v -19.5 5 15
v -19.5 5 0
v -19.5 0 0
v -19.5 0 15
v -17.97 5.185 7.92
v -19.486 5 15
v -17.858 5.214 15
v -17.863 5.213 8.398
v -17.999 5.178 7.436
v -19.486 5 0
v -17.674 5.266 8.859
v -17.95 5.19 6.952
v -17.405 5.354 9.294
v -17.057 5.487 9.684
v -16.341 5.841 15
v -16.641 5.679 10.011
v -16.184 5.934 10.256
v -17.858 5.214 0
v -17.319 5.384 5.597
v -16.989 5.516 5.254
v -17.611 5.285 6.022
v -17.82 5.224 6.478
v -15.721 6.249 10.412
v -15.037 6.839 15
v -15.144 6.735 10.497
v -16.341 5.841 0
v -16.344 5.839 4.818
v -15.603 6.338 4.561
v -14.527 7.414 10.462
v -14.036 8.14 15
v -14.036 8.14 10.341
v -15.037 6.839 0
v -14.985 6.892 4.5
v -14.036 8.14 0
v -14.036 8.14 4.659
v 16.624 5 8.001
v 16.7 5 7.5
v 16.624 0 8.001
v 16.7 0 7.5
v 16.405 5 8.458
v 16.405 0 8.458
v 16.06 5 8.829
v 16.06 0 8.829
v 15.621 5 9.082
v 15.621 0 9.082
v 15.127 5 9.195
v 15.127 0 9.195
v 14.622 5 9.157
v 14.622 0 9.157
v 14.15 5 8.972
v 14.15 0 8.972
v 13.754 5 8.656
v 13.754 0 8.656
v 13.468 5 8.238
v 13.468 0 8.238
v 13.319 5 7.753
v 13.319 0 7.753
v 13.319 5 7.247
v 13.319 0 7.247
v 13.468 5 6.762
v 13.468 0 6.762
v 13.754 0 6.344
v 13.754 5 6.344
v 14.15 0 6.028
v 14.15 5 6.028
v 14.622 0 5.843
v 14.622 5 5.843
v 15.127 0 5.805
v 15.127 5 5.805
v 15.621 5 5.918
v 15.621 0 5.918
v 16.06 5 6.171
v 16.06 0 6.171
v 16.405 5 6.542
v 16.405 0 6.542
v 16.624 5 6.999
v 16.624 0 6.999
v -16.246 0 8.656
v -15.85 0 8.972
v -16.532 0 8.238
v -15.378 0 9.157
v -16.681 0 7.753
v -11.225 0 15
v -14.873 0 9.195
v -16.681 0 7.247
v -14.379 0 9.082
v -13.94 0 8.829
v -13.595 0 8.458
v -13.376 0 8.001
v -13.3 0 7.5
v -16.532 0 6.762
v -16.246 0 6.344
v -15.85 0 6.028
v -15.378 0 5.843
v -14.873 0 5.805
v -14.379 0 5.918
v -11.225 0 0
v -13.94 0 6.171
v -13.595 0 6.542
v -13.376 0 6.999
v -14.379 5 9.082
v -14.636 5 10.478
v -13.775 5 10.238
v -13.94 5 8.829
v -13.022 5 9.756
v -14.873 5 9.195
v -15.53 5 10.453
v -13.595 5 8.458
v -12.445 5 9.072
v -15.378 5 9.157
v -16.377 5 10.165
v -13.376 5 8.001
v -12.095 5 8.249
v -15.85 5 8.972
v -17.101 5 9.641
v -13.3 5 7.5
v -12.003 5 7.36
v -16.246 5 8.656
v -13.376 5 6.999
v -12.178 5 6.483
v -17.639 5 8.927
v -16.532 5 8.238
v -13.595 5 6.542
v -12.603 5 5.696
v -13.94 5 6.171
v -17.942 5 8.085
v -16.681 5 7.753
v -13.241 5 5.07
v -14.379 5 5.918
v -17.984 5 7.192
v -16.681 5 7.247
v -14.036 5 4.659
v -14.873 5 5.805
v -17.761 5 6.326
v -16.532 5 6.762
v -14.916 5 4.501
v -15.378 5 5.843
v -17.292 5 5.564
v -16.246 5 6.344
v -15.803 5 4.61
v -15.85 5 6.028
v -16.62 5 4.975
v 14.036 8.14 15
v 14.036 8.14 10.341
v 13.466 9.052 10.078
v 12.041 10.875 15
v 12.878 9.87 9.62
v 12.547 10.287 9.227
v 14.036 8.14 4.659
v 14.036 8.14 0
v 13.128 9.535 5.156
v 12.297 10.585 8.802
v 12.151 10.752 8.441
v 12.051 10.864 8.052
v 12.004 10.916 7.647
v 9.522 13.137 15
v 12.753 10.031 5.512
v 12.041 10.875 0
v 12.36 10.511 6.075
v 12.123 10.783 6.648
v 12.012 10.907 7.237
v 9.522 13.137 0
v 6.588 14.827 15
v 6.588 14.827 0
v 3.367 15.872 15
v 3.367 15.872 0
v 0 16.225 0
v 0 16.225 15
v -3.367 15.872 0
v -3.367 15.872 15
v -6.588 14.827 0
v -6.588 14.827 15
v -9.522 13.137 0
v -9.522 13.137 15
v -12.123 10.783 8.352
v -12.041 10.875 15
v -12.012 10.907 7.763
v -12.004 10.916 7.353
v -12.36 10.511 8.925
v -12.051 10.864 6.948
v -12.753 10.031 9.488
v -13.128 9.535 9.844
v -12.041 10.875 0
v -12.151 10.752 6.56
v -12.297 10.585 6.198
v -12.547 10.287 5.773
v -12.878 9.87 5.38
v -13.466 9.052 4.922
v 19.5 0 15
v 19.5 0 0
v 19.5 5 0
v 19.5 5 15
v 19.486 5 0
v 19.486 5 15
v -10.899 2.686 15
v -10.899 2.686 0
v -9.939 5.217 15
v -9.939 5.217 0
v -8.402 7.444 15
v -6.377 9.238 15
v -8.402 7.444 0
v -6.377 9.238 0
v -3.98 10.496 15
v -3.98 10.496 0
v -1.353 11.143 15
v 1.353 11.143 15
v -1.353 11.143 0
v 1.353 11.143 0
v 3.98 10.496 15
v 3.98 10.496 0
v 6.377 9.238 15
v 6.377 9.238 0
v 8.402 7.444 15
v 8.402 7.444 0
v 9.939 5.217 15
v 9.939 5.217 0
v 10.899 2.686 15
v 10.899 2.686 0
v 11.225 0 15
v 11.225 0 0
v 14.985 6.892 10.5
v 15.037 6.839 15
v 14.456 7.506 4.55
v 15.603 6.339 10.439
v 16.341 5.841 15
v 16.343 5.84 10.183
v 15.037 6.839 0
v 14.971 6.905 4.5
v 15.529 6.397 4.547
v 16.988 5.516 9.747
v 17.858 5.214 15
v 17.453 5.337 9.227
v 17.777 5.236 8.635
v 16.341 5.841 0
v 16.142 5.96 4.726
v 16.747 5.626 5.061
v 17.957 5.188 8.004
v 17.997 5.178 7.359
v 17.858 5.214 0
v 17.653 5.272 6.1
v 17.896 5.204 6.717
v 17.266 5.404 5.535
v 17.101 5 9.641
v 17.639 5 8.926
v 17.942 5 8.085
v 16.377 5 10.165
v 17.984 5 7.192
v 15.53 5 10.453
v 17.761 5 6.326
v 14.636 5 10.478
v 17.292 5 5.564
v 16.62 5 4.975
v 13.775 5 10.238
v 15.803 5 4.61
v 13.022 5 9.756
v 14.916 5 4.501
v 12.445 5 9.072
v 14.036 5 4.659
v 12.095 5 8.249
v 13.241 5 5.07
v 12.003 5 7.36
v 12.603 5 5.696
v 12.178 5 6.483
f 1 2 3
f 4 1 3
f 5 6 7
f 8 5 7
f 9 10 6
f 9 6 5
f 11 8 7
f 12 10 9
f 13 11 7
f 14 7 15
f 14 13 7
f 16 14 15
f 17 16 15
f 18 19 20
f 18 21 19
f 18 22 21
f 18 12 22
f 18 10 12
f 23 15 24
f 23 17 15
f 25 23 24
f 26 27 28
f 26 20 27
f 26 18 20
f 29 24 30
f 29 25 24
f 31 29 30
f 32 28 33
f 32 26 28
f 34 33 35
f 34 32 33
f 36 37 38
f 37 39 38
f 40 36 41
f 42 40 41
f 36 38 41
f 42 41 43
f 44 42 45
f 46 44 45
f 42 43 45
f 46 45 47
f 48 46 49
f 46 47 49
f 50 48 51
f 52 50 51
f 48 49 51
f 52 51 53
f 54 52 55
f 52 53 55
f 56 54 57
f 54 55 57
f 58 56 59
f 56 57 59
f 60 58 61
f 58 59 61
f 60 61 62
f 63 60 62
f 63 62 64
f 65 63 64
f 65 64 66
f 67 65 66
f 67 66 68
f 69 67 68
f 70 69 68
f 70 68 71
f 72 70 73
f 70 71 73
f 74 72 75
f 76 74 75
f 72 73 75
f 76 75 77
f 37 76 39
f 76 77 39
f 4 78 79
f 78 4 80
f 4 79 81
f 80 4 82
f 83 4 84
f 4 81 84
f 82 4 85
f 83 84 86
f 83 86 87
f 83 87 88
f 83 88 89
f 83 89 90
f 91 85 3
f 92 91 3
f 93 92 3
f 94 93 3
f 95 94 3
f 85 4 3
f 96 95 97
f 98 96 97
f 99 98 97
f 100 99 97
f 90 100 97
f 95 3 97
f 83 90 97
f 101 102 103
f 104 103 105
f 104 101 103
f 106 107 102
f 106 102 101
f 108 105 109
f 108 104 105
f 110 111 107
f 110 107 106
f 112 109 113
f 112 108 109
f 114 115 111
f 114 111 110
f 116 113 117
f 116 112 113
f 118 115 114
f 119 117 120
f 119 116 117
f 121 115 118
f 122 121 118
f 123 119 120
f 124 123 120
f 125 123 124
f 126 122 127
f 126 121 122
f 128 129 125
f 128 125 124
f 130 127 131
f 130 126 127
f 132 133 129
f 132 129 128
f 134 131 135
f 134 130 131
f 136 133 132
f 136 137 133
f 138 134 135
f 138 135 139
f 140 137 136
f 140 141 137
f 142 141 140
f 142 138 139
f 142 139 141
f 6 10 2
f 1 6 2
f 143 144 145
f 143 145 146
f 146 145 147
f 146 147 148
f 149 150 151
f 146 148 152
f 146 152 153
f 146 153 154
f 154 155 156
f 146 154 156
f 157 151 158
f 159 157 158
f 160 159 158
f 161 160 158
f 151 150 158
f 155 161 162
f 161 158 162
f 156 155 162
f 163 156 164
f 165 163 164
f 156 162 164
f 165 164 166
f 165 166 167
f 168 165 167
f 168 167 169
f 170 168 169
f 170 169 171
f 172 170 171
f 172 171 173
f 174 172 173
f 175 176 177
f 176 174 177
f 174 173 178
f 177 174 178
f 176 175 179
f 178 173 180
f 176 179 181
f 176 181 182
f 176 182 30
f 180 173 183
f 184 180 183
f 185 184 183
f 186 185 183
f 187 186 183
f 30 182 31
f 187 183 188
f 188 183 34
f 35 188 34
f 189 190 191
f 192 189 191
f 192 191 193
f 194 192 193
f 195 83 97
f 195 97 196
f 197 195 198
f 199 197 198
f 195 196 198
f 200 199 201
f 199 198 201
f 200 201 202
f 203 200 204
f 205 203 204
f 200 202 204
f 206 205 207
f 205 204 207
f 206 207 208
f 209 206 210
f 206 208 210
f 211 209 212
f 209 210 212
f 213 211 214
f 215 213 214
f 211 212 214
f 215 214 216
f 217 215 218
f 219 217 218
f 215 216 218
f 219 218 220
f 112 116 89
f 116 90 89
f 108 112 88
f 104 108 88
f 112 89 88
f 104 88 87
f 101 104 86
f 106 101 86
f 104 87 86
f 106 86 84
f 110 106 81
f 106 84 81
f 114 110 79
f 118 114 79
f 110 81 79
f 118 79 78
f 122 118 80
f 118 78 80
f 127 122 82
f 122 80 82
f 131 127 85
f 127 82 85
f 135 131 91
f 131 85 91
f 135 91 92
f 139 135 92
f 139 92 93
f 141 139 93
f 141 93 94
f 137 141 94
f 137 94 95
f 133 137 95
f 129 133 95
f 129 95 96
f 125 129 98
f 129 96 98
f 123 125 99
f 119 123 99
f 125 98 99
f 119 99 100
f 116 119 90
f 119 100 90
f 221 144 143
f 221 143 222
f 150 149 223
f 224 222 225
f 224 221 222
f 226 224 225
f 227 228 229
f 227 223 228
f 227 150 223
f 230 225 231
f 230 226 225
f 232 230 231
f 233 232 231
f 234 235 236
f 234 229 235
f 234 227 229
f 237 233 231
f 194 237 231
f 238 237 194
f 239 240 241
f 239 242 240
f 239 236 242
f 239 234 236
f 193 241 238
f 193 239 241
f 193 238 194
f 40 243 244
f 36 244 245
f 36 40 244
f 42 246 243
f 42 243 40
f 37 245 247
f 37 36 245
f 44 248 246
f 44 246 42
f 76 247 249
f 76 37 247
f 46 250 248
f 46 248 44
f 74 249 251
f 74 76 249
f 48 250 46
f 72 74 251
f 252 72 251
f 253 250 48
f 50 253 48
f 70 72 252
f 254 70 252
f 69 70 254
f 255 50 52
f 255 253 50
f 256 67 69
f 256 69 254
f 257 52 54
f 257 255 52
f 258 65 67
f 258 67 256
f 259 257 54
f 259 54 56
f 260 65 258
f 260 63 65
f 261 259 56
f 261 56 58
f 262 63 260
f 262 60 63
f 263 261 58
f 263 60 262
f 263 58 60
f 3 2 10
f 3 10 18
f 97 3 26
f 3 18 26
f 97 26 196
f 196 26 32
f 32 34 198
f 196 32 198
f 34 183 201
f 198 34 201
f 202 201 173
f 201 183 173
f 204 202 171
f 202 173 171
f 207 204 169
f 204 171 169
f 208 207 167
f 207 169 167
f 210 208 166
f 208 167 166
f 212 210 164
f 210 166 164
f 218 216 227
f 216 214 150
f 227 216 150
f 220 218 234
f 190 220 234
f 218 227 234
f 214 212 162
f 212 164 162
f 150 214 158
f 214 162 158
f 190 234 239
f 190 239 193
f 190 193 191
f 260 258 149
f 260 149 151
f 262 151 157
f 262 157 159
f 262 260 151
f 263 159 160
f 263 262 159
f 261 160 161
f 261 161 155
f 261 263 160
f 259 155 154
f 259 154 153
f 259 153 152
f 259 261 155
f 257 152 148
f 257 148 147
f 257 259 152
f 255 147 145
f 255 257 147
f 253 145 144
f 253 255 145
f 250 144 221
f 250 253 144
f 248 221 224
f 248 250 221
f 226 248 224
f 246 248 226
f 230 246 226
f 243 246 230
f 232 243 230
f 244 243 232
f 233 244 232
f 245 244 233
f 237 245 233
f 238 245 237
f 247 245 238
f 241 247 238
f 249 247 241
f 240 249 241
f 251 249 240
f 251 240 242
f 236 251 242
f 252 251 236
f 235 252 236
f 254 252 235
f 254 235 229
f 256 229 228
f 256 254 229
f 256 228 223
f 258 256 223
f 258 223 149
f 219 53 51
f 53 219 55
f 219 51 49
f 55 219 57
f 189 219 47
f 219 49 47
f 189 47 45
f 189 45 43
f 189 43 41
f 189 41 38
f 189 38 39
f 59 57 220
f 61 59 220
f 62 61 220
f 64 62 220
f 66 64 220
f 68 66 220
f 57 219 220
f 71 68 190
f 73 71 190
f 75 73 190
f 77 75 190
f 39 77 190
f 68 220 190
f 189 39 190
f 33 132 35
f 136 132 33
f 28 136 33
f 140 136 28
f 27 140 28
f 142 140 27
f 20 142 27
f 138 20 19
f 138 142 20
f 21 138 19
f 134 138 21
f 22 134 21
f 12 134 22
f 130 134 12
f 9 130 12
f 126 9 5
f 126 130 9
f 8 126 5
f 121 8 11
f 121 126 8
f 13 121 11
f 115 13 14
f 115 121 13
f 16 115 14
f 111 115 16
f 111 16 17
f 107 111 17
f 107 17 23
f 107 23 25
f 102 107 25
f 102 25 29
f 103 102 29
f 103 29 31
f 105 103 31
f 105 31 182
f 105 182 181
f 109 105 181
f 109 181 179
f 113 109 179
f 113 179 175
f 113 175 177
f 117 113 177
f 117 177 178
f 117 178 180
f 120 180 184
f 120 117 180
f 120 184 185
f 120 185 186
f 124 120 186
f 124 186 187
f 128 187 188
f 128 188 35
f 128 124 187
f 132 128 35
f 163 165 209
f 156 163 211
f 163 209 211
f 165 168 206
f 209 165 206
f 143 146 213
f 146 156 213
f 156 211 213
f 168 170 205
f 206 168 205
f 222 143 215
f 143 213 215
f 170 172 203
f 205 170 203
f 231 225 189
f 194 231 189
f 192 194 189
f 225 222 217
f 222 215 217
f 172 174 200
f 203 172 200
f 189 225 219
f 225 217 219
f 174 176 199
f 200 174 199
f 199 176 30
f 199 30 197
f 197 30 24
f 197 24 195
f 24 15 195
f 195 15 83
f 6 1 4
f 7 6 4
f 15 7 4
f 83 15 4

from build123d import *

# Parameters (mm, degrees)
Y_KSEKLIK_EKSTR_ZYON1_DEPTH = 15
IZIM2_R                     = 1.7
KES_EKSTR_ZYON2_DEPTH       = 15
RADYUS3_R                   = 6.3
IZIM3_R                     = 3
KES_EKSTR_ZYON3_DEPTH       = 15


with BuildPart() as part:
    # Çizim1 → Yükseklik-Ekstrüzyon1 (new body)
    with BuildSketch(Plane.XY):
        with BuildLine():
            Line((-19.5, 0), (-11.225, 0))
            ThreePointArc((-11.225, 0), (0, 11.225), (11.225, 0))
            Line((11.225, 0), (19.5, 0))
            Line((19.5, 0), (19.5, 5))
            Line((19.5, 5), (15.435369286, 5))
            ThreePointArc((15.435369286, 5), (0, 16.225), (-15.435369286, 5))
            Line((-15.435369286, 5), (-19.5, 5))
            Line((-19.5, 5), (-19.5, 0))
        make_face()
    extrude(amount=Y_KSEKLIK_EKSTR_ZYON1_DEPTH)

    # Çizim2 → Kes-Ekstrüzyon2 (cut)
    with BuildSketch(Plane.XZ):
        with Locations((-15, 7.5)):
            Circle(IZIM2_R)
        with Locations((15, 7.5)):
            Circle(IZIM2_R)
    extrude(amount=-KES_EKSTR_ZYON2_DEPTH, mode=Mode.SUBTRACT)

    # Radyus3
    # the kernel refuses this fillet: 6.3 mm, written as the material it adds along each edge
    with BuildSketch(Plane(origin=(-15.435369286, 5, -0.982079778), x_dir=(-1, 0, 0), z_dir=(0, 0, 1))) as radyus3_piece_1_section:
        with BuildLine():
            CenterArc((4.050154186, -6.3), RADYUS3_R, 90, 59.889795344)
            ThreePointArc((-1.399736951, -3.139511654), (-0.61649222, -1.60692875), (0, 0))
            Line((0, 0), (4.050154186, 0))
        make_face()
    radyus3_piece_1 = extrude(amount=15.982079778, mode=Mode.PRIVATE)
    radyus3_piece_1 = split(radyus3_piece_1, bisect_by=Plane(origin=(-18.387347424, 5.060237856, 0), z_dir=(0, 0, 1)), keep=Keep.TOP, mode=Mode.PRIVATE)
    radyus3_piece_1 = radyus3_piece_1 - Plane(origin=(-15, 5.060237856, 7.5), x_dir=(1, 0, 0), z_dir=(0, -1, 0)) * Cylinder(1.7, 49, mode=Mode.PRIVATE)
    add(radyus3_piece_1)
    with BuildSketch(Plane(origin=(15.435369286, 5, -0.982079778), x_dir=(-0.4072067026202576, 0.9133360287107571, 0), z_dir=(0, 0, 1))) as radyus3_piece_2_section:
        with BuildLine():
            CenterArc((4.10476705, -6.264553967), RADYUS3_R, 96.080720065, 59.889795344)
            Line((-1.649249931, -3.69915174), (0, 0))
            ThreePointArc((0, 0), (1.718705687, -0.091287601), (3.437411374, 0))
        make_face()
    radyus3_piece_2 = extrude(amount=15.982079778, mode=Mode.PRIVATE)
    radyus3_piece_2 = split(radyus3_piece_2, bisect_by=Plane(origin=(14.638658108, 7.219740405, 0), z_dir=(0, 0, 1)), keep=Keep.TOP, mode=Mode.PRIVATE)
    radyus3_piece_2 = radyus3_piece_2 - Plane(origin=(15, 7.219740405, 7.5), x_dir=(1, 0, 0), z_dir=(0, -1, 0)) * Cylinder(1.7, 47, mode=Mode.PRIVATE)
    add(radyus3_piece_2)

    # Çizim3 → Kes-Ekstrüzyon3 (cut)
    with BuildSketch(Plane(origin=(0, 5, 0), x_dir=(1, 0, 0), z_dir=(0, 1, 0))):
        with Locations(Location((-15, -7.5, 0), (0, 0, 71.249080341))):
            Circle(IZIM3_R)
        with Locations(Location((15, -7.5, 0), (0, 0, 108.750992195))):
            Circle(IZIM3_R)
    extrude(amount=KES_EKSTR_ZYON3_DEPTH, mode=Mode.SUBTRACT)


solid = part.part
